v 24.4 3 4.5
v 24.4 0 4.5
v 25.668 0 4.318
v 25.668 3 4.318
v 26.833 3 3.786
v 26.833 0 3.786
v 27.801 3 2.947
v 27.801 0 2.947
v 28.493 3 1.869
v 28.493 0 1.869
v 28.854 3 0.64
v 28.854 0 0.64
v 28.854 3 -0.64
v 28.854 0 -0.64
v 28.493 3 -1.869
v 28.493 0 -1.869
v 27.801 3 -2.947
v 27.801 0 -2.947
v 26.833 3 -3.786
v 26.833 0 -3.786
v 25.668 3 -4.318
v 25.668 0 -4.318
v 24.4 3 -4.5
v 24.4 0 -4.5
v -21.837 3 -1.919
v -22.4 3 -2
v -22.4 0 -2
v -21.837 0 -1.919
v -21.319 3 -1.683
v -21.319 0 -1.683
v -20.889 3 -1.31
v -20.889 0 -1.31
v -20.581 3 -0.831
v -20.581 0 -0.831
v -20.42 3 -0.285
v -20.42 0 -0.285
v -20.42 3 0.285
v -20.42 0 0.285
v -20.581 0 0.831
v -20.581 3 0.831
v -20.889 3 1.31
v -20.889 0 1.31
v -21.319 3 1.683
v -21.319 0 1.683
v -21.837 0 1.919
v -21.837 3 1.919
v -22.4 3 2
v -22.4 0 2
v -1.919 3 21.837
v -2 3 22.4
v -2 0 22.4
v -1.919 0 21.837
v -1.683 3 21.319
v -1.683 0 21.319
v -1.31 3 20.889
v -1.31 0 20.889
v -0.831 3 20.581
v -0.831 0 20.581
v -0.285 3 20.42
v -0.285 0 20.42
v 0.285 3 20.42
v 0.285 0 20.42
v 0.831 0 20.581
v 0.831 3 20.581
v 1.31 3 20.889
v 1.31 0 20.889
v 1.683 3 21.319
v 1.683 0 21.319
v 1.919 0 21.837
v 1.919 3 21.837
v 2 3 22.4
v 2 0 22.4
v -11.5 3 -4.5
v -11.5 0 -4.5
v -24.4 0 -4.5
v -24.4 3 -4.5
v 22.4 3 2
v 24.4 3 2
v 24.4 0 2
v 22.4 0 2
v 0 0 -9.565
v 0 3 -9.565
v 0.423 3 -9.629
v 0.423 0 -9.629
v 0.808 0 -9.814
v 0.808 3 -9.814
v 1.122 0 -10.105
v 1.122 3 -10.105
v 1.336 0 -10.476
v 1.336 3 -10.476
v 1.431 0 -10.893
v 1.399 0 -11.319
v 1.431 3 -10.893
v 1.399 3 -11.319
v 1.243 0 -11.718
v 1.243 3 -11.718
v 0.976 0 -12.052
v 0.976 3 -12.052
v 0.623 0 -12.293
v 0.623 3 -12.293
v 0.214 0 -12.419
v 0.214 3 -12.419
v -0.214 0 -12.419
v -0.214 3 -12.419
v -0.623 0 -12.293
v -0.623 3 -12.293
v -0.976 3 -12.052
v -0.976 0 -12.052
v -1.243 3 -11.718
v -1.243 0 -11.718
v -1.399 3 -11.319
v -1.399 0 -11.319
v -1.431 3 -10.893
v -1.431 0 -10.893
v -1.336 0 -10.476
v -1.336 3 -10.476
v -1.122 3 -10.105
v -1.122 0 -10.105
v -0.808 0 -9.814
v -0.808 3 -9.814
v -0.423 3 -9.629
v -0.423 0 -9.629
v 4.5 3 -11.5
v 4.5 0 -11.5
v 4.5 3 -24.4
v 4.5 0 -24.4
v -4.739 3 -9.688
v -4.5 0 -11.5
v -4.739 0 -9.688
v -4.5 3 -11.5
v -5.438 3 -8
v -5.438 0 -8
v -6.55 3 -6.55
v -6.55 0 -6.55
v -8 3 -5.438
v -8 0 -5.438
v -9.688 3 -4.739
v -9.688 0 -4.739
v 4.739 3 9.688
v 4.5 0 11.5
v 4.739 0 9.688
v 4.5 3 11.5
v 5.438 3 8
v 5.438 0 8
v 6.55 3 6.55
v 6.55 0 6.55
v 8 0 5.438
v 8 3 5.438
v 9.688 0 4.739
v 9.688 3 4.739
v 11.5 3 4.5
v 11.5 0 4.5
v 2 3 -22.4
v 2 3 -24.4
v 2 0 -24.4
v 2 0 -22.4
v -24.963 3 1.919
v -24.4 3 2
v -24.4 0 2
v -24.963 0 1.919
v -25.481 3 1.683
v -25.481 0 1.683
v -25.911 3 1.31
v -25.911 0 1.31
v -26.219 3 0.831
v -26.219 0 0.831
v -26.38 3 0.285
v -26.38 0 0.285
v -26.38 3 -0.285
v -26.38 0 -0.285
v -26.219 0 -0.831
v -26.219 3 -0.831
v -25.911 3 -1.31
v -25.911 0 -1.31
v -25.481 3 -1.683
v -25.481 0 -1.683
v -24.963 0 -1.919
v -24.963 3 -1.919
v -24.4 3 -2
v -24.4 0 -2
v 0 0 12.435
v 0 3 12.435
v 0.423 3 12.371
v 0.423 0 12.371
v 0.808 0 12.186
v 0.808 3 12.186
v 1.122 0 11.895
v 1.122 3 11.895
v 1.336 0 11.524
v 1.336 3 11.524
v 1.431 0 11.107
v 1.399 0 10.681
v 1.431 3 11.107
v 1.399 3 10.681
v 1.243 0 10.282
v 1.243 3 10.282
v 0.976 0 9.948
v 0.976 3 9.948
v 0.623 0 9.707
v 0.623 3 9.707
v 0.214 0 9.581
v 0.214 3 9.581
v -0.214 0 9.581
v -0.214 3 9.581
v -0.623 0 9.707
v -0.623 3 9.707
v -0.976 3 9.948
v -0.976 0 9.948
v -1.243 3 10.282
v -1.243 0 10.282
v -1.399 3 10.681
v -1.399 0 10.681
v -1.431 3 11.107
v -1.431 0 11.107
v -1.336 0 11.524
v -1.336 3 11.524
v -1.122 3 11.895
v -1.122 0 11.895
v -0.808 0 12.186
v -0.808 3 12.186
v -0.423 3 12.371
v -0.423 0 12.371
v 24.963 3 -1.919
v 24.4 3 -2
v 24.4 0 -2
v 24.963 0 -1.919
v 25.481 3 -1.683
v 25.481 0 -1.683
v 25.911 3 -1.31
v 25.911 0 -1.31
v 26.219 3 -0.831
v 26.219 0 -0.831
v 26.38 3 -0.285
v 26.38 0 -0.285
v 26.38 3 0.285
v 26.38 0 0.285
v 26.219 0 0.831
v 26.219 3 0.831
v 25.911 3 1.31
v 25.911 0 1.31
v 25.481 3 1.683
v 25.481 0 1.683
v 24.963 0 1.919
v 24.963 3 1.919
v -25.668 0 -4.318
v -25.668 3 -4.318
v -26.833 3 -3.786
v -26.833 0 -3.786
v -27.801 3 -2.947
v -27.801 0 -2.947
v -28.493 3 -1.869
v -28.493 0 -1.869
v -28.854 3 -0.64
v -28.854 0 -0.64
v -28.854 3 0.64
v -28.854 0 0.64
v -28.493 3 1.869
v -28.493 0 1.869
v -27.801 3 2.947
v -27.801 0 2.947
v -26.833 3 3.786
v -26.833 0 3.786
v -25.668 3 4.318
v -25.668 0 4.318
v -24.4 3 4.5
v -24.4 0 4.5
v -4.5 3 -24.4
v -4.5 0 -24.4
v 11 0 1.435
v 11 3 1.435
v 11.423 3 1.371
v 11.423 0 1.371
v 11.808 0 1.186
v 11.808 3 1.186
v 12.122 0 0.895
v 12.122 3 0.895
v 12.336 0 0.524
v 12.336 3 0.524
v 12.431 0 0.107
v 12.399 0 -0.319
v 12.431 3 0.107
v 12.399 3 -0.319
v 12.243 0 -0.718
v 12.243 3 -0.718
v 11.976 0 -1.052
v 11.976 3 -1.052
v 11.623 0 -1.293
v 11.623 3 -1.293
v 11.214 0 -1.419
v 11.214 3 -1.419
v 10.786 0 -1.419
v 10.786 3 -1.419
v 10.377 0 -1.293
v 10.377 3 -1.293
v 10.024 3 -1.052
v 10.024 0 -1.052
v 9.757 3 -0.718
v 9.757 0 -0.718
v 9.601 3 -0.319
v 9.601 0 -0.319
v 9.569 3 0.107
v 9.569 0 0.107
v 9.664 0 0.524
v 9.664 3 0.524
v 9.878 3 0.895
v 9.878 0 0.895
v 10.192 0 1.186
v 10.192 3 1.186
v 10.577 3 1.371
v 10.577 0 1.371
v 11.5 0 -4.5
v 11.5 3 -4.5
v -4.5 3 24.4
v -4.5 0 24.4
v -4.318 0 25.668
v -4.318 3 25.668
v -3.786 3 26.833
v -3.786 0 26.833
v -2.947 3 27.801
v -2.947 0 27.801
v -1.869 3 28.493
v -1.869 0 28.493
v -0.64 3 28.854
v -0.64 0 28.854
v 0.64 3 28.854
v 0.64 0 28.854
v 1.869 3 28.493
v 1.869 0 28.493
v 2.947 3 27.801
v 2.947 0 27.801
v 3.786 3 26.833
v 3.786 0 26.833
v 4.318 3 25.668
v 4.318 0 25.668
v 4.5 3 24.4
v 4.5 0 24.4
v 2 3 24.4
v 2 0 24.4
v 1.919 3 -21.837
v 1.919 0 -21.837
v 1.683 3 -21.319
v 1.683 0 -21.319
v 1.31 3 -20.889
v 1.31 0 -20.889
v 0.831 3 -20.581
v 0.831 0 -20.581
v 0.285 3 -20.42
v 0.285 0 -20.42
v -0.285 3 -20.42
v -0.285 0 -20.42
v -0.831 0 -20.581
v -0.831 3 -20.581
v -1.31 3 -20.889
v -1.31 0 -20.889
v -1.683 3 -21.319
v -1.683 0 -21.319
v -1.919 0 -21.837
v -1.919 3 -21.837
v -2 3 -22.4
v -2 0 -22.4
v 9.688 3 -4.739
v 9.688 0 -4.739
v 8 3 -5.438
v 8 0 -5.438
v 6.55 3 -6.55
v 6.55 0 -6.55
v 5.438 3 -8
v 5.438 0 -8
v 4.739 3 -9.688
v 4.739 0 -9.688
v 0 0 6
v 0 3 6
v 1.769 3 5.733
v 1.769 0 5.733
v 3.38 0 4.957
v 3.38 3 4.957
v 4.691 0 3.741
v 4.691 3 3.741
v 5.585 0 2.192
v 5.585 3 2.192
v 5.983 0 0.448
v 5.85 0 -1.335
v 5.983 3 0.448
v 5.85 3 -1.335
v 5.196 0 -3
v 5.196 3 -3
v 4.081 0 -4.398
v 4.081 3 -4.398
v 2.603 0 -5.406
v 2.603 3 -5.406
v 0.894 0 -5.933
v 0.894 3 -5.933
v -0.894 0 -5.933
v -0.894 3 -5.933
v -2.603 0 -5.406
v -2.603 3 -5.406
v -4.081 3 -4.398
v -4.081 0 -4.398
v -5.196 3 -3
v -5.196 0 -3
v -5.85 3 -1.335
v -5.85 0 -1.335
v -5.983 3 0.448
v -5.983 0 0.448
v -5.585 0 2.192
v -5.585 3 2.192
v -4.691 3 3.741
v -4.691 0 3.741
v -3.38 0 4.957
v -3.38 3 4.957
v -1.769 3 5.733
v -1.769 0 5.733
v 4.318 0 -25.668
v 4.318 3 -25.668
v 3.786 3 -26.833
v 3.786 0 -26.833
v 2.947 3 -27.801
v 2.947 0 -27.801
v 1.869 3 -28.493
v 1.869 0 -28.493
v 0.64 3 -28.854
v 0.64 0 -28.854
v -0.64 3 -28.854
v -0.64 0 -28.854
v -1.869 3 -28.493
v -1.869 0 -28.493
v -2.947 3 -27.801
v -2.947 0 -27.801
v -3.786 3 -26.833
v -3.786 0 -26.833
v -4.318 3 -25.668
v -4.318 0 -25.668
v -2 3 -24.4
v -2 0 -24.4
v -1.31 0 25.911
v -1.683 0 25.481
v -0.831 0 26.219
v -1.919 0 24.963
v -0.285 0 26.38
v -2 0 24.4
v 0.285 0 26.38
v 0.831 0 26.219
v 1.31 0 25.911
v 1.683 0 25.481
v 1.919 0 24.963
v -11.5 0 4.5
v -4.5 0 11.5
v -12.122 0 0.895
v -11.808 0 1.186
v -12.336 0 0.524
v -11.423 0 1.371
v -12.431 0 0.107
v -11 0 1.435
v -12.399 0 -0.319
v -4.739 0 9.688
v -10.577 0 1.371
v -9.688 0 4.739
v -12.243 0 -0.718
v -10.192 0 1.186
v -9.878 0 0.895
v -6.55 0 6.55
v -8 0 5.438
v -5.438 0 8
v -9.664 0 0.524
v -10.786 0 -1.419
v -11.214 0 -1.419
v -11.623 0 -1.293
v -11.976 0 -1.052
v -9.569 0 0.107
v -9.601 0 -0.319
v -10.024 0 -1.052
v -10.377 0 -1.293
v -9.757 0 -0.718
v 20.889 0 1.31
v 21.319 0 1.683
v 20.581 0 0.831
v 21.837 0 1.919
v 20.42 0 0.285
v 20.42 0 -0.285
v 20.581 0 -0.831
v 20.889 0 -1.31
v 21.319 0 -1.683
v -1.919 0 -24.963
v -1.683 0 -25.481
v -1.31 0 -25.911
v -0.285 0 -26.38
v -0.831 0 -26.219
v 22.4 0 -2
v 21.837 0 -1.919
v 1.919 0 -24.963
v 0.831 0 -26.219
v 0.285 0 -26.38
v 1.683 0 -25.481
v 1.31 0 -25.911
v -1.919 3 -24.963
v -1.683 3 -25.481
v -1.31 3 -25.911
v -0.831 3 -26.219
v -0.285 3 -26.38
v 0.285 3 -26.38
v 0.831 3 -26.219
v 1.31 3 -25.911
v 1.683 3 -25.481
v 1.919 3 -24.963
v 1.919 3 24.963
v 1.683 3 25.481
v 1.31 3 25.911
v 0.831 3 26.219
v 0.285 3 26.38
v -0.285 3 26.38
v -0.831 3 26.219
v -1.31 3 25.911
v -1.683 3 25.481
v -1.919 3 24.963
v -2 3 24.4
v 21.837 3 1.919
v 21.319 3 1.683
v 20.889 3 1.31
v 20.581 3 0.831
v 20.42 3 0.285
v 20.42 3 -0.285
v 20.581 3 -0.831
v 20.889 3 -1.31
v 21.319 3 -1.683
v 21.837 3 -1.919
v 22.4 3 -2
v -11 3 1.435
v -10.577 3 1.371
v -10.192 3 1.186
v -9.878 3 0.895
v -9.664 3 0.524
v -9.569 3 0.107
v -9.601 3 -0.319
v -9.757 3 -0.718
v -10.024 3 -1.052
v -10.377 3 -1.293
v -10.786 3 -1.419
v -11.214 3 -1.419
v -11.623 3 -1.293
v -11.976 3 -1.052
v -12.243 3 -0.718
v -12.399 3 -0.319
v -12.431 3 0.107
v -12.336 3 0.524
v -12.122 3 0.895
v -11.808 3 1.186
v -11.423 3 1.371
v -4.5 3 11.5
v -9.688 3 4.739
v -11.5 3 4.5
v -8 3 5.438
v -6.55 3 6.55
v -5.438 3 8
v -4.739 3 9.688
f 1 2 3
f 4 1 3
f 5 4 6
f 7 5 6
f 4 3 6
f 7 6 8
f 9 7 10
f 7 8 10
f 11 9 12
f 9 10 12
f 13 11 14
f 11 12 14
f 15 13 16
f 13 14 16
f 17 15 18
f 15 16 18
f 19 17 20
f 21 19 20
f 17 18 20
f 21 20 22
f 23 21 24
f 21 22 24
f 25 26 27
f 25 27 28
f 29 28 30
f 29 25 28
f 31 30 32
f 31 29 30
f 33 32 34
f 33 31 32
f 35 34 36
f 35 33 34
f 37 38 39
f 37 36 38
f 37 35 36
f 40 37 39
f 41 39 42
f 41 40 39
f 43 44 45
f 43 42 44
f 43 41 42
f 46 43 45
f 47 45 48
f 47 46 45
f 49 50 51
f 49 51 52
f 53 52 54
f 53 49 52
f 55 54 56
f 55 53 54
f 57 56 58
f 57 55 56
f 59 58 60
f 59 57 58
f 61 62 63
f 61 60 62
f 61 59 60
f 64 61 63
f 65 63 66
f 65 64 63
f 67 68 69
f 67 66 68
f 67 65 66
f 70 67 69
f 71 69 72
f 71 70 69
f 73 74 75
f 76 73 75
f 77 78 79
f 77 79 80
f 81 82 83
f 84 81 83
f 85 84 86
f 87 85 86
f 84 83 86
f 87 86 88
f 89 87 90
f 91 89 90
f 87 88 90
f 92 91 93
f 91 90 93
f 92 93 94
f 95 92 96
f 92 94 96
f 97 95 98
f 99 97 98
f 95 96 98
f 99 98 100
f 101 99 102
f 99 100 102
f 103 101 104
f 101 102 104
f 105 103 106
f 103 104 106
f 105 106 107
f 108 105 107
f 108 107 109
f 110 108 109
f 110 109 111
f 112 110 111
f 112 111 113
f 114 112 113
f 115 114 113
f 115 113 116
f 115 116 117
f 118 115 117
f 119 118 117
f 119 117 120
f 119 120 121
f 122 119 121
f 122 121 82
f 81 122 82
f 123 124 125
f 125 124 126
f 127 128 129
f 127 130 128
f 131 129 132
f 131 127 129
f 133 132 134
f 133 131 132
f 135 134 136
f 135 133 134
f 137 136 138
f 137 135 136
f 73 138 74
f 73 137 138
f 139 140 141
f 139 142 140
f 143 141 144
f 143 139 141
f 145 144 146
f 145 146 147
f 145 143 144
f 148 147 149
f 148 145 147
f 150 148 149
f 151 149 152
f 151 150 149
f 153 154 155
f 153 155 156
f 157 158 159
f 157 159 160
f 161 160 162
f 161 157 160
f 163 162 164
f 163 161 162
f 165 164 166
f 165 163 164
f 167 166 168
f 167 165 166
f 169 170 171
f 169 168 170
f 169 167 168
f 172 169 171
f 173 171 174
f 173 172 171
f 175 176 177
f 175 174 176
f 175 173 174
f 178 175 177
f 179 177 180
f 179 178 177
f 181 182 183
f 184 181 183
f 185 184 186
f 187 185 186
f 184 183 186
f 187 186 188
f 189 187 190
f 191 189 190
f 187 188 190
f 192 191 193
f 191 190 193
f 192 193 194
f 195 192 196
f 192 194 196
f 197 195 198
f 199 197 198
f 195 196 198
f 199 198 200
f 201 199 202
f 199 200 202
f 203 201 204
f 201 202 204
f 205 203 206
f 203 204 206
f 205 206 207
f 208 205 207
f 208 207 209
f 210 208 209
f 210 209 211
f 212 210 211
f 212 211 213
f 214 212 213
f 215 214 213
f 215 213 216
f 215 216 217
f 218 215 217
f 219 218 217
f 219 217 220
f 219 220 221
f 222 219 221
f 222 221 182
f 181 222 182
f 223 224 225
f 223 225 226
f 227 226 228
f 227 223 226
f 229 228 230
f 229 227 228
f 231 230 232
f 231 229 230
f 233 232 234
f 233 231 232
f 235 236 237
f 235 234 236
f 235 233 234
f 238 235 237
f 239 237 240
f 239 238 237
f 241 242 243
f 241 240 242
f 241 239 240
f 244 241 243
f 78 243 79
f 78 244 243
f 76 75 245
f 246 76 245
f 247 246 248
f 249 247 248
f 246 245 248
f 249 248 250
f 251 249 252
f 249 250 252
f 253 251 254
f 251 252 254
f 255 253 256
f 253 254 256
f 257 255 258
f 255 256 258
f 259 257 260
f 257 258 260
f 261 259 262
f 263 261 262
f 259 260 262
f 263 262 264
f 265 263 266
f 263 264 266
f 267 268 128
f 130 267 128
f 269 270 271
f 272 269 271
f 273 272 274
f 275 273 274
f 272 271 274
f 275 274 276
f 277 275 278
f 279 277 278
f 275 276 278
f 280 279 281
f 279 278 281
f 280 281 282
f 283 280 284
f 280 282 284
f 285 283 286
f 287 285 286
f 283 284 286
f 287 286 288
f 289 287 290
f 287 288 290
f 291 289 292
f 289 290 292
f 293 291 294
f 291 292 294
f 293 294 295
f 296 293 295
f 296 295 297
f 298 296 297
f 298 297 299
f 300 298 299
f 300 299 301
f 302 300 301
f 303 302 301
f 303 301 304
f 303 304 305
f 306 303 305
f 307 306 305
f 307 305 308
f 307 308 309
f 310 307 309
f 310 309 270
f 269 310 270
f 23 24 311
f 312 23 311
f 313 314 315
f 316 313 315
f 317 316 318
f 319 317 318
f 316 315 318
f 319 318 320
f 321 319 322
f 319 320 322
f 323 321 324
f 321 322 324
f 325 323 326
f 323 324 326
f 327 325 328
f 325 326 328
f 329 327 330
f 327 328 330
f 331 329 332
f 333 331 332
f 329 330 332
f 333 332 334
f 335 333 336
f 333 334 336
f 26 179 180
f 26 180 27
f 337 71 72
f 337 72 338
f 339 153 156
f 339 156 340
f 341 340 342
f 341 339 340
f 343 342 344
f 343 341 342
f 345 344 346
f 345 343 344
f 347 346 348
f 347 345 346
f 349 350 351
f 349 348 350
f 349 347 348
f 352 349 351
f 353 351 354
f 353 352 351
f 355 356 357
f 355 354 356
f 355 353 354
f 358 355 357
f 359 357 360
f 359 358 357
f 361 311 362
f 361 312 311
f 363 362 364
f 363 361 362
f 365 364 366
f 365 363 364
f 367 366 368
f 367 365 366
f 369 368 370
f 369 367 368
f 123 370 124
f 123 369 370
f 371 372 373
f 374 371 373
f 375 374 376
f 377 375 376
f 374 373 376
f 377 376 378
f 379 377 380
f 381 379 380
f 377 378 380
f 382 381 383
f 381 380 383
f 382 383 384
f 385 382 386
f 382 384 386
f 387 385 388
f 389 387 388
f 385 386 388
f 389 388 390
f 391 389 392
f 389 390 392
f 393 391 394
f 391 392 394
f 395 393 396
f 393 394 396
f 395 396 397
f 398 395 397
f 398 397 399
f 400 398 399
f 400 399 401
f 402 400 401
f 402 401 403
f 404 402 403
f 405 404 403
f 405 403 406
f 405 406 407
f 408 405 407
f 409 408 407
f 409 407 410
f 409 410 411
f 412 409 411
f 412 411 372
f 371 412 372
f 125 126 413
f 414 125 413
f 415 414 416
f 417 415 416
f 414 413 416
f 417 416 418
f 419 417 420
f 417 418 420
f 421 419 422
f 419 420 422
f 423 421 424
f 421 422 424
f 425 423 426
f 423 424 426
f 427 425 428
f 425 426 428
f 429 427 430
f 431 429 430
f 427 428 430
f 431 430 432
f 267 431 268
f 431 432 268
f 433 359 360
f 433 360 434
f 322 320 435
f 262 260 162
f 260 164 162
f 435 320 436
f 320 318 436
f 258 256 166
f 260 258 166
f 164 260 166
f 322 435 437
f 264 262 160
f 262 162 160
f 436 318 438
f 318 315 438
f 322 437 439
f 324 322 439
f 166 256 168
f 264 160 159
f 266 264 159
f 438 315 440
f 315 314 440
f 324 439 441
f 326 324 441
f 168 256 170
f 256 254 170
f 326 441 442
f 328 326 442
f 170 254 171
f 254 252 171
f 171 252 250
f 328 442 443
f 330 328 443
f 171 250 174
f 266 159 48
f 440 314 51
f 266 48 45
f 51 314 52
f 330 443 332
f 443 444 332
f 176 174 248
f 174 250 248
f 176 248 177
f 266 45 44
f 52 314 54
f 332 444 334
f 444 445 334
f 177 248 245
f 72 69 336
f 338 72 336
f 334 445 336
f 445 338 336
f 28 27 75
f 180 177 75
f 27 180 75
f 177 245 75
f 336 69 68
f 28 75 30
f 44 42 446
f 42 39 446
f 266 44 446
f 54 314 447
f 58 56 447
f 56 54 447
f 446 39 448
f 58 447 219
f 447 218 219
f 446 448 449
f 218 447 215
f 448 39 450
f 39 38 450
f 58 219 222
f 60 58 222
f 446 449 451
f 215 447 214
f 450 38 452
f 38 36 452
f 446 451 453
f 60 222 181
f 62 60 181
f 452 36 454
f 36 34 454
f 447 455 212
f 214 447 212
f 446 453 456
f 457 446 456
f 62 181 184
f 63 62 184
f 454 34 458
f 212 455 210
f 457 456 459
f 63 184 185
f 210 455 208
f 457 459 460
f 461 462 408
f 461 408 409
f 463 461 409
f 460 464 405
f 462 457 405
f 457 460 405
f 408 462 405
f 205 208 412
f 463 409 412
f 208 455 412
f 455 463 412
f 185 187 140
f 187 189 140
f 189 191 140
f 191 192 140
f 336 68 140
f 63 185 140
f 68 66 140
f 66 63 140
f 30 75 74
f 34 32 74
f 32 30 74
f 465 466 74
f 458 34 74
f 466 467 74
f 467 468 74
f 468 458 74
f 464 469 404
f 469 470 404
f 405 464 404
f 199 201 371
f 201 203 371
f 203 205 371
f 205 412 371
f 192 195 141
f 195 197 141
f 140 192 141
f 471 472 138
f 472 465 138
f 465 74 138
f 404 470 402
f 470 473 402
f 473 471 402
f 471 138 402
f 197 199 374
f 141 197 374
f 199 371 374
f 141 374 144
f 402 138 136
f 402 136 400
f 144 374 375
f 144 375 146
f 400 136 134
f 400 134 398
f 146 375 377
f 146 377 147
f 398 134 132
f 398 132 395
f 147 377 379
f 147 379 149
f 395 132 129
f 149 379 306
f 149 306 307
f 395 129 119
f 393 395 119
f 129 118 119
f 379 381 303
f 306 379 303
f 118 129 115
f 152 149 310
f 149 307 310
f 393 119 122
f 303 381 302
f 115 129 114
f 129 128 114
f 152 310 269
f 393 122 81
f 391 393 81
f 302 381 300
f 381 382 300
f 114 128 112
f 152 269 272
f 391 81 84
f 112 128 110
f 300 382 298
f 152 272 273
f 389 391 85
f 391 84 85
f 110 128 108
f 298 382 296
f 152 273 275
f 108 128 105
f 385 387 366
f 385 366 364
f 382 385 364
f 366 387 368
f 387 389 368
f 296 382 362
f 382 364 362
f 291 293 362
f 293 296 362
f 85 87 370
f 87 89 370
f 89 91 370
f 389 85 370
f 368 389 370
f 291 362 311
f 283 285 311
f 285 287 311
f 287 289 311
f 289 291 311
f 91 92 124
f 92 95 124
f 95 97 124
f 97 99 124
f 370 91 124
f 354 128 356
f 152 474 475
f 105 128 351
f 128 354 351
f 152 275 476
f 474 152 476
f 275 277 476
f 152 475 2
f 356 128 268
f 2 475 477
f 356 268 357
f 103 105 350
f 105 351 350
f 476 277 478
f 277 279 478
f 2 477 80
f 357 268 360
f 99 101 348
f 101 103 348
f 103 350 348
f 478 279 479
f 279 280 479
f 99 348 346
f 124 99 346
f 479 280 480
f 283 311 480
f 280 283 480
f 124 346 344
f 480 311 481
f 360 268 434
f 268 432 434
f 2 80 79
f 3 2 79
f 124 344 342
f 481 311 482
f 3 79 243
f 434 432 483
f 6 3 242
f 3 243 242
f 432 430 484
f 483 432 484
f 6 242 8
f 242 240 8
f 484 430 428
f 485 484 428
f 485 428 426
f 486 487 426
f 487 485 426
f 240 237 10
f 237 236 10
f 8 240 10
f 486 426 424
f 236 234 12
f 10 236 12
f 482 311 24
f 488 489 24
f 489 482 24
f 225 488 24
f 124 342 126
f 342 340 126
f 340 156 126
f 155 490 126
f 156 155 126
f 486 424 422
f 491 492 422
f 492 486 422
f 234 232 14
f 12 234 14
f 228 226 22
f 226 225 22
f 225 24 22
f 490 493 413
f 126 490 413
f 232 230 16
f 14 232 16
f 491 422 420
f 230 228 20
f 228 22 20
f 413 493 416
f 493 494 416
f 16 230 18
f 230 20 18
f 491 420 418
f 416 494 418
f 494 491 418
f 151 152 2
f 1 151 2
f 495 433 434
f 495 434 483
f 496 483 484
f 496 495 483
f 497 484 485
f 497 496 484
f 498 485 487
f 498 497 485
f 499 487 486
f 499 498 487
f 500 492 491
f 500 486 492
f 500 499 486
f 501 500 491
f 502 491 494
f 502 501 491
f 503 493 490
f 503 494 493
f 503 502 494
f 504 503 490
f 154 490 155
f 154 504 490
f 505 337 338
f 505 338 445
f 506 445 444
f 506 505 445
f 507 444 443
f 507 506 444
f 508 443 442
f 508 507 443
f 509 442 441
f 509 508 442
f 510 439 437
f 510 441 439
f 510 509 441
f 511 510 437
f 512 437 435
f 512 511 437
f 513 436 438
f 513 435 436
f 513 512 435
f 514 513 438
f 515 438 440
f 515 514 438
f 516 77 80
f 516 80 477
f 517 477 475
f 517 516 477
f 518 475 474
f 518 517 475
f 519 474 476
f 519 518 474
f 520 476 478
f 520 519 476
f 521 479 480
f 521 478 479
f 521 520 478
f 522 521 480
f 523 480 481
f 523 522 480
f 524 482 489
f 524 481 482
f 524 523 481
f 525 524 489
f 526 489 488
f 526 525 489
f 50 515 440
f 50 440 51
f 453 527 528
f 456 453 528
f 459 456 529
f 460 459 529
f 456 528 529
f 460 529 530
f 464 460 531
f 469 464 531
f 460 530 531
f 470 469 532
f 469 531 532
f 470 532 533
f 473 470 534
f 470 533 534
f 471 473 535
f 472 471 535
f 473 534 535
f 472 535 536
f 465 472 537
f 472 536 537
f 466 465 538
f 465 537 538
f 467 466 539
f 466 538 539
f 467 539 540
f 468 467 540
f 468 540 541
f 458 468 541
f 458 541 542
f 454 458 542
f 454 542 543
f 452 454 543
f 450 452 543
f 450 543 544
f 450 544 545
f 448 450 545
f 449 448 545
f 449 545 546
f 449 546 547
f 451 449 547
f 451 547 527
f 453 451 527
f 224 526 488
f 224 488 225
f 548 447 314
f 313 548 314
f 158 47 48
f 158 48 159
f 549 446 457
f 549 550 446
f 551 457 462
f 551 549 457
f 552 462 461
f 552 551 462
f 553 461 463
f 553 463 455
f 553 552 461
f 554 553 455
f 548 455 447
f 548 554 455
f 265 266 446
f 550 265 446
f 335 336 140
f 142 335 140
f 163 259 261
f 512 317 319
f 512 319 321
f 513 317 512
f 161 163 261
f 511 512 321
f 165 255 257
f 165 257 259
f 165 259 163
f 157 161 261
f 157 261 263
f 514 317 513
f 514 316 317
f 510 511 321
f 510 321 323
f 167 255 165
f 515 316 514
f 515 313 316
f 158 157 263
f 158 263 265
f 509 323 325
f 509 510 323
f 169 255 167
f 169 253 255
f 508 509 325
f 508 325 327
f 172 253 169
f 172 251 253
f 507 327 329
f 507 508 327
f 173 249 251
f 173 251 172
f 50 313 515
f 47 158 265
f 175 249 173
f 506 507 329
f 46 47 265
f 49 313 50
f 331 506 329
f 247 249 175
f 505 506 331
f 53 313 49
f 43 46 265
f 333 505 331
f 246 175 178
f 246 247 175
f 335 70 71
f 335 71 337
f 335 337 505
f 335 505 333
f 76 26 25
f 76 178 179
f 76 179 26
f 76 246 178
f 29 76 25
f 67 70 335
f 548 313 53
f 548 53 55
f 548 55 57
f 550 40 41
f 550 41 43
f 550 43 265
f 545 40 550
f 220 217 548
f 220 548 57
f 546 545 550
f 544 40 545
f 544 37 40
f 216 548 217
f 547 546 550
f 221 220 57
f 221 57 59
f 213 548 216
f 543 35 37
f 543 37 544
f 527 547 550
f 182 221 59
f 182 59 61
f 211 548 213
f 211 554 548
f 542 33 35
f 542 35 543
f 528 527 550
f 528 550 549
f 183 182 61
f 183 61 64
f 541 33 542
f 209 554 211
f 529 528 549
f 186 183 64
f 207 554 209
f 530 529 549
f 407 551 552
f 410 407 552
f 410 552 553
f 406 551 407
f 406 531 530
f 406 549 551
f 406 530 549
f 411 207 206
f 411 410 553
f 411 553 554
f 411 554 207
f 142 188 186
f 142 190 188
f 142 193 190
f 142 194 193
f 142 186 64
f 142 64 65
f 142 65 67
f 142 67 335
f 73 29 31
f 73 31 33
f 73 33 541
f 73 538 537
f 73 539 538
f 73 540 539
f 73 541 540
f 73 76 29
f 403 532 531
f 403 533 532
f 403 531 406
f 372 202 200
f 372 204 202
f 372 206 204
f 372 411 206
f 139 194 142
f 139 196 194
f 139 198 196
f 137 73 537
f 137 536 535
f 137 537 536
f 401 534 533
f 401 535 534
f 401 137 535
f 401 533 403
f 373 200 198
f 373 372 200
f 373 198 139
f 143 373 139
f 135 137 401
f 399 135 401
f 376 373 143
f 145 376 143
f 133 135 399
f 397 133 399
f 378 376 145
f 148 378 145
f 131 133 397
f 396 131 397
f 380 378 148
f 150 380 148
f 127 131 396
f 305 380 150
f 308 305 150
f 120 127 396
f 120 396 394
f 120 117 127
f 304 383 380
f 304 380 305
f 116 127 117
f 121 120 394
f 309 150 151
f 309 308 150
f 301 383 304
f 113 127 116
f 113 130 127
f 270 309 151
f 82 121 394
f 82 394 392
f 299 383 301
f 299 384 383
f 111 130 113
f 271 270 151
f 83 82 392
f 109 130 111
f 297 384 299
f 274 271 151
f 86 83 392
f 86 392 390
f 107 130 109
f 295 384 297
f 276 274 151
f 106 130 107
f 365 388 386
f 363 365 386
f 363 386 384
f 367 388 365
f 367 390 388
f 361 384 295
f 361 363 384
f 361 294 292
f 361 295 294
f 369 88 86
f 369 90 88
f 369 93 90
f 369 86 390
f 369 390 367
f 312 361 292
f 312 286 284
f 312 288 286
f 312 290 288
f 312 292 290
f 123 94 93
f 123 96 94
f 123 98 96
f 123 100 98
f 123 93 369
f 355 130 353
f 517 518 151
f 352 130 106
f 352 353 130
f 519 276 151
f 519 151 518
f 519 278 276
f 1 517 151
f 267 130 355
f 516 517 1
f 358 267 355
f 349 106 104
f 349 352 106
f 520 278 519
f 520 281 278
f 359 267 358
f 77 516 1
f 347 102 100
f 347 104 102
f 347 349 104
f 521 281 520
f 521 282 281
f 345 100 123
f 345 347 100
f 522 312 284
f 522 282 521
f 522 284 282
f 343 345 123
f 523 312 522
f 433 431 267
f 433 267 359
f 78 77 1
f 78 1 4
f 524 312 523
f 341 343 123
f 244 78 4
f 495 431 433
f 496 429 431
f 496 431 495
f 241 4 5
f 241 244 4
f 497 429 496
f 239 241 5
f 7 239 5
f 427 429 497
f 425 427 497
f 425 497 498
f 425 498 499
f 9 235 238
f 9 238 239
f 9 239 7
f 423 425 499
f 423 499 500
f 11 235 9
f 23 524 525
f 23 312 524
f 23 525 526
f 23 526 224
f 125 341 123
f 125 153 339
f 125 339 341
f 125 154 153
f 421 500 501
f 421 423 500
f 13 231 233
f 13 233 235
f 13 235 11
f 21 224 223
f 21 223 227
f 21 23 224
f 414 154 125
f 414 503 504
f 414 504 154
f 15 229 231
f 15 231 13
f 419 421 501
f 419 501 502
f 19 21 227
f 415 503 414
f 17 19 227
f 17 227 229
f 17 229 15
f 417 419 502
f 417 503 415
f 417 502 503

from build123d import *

# Parameters (mm, degrees)
SKETCH1_W           = 9
SKETCH1_H           = 9
BOSS_EXTRUDE1_DEPTH = 3
FILLET1_R           = 7
SKETCH2_R           = 6
CUT_EXTRUDE1_DEPTH  = 41.980727178
SKETCH5_R           = 1.4351
CUT_EXTRUDE2_DEPTH  = 41.980727178
CUT_EXTRUDE3_DEPTH  = 41.980727178


with BuildPart() as part:
    # Sketch1 → Boss-Extrude1 (new body)
    with BuildSketch(Plane(origin=(0, 0, 0), x_dir=(1, 0, 0), z_dir=(0, 1, 0))):
        with BuildLine():
            Line((4.5, -24.4), (4.5, -4.5))
            Line((4.5, -4.5), (-4.5, -4.5))
            Line((-4.5, -4.5), (-4.5, -24.4))
            ThreePointArc((-4.5, -24.4), (0, -28.9), (4.5, -24.4))
        make_face()
        Rectangle(SKETCH1_W, SKETCH1_H)
        with BuildLine():
            Line((24.4, 4.5), (4.5, 4.5))
            Line((4.5, 4.5), (4.5, -4.5))
            Line((4.5, -4.5), (24.4, -4.5))
            ThreePointArc((24.4, -4.5), (28.9, 0), (24.4, 4.5))
        make_face()
        with BuildLine():
            Line((4.5, 4.5), (4.5, 24.4))
            ThreePointArc((4.5, 24.4), (0, 28.9), (-4.5, 24.4))
            Line((-4.5, 24.4), (-4.5, 4.5))
            Line((-4.5, 4.5), (4.5, 4.5))
        make_face()
        with BuildLine():
            Line((-4.5, -4.5), (-4.5, 4.5))
            Line((-4.5, 4.5), (-24.4, 4.5))
            ThreePointArc((-24.4, 4.5), (-28.9, 0), (-24.4, -4.5))
            Line((-24.4, -4.5), (-4.5, -4.5))
        make_face()
    extrude(amount=BOSS_EXTRUDE1_DEPTH)

    # Fillet1
    fillet1_edges = [part.edges().sort_by_distance(p)[0] for p in [
        (-4.5, 1.5, 4.5),
        (-4.5, 1.5, -4.5),
        (4.5, 1.5, -4.5),
        (4.5, 1.5, 4.5),
    ]]
    fillet(fillet1_edges, radius=FILLET1_R)

    # Sketch2 → Cut-Extrude1 (cut, through all)
    with BuildSketch(Plane(origin=(0, 3, 0), x_dir=(1, 0, 0), z_dir=(0, 1, 0))):
        with Locations(Location((0, 0, 0), (0, 0, 270))):
            Circle(SKETCH2_R)
    extrude(amount=-CUT_EXTRUDE1_DEPTH, mode=Mode.SUBTRACT)

    # Sketch5 → Cut-Extrude2 (cut, through all)
    with BuildSketch(Plane(origin=(0, 3, 0), x_dir=(1, 0, 0), z_dir=(0, 1, 0))):
        with Locations(Location((-11, 0, 0), (0, 0, 270))):
            Circle(SKETCH5_R)
        with Locations(Location((0, 11, 0), (0, 0, 270))):
            Circle(SKETCH5_R)
        with Locations(Location((11, 0, 0), (0, 0, 270))):
            Circle(SKETCH5_R)
        with Locations(Location((0, -11, 0), (0, 0, 270))):
            Circle(SKETCH5_R)
    extrude(amount=-CUT_EXTRUDE2_DEPTH, mode=Mode.SUBTRACT)

    # Sketch6 → Cut-Extrude3 (cut, through all)
    with BuildSketch(Plane(origin=(0, 3, 0), x_dir=(1, 0, 0), z_dir=(0, 1, 0))):
        with BuildLine():
            Line((-22.4, -2), (-24.4, -2))
            ThreePointArc((-24.4, -2), (-26.4, 0), (-24.4, 2))
            Line((-24.4, 2), (-22.4, 2))
            ThreePointArc((-22.4, 2), (-20.4, 0), (-22.4, -2))
        make_face()
        with BuildLine():
            Line((-2, 22.4), (-2, 24.4))
            ThreePointArc((-2, 24.4), (0, 26.4), (2, 24.4))
            Line((2, 24.4), (2, 22.4))
            ThreePointArc((2, 22.4), (0, 20.4), (-2, 22.4))
        make_face()
        with BuildLine():
            Line((22.4, 2), (24.4, 2))
            ThreePointArc((24.4, 2), (26.4, 0), (24.4, -2))
            Line((24.4, -2), (22.4, -2))
            ThreePointArc((22.4, -2), (20.4, 0), (22.4, 2))
        make_face()
        with BuildLine():
            Line((2, -22.4), (2, -24.4))
            ThreePointArc((2, -24.4), (0, -26.4), (-2, -24.4))
            Line((-2, -24.4), (-2, -22.4))
            ThreePointArc((-2, -22.4), (0, -20.4), (2, -22.4))
        make_face()
    extrude(amount=-CUT_EXTRUDE3_DEPTH, mode=Mode.SUBTRACT)


solid = part.part
